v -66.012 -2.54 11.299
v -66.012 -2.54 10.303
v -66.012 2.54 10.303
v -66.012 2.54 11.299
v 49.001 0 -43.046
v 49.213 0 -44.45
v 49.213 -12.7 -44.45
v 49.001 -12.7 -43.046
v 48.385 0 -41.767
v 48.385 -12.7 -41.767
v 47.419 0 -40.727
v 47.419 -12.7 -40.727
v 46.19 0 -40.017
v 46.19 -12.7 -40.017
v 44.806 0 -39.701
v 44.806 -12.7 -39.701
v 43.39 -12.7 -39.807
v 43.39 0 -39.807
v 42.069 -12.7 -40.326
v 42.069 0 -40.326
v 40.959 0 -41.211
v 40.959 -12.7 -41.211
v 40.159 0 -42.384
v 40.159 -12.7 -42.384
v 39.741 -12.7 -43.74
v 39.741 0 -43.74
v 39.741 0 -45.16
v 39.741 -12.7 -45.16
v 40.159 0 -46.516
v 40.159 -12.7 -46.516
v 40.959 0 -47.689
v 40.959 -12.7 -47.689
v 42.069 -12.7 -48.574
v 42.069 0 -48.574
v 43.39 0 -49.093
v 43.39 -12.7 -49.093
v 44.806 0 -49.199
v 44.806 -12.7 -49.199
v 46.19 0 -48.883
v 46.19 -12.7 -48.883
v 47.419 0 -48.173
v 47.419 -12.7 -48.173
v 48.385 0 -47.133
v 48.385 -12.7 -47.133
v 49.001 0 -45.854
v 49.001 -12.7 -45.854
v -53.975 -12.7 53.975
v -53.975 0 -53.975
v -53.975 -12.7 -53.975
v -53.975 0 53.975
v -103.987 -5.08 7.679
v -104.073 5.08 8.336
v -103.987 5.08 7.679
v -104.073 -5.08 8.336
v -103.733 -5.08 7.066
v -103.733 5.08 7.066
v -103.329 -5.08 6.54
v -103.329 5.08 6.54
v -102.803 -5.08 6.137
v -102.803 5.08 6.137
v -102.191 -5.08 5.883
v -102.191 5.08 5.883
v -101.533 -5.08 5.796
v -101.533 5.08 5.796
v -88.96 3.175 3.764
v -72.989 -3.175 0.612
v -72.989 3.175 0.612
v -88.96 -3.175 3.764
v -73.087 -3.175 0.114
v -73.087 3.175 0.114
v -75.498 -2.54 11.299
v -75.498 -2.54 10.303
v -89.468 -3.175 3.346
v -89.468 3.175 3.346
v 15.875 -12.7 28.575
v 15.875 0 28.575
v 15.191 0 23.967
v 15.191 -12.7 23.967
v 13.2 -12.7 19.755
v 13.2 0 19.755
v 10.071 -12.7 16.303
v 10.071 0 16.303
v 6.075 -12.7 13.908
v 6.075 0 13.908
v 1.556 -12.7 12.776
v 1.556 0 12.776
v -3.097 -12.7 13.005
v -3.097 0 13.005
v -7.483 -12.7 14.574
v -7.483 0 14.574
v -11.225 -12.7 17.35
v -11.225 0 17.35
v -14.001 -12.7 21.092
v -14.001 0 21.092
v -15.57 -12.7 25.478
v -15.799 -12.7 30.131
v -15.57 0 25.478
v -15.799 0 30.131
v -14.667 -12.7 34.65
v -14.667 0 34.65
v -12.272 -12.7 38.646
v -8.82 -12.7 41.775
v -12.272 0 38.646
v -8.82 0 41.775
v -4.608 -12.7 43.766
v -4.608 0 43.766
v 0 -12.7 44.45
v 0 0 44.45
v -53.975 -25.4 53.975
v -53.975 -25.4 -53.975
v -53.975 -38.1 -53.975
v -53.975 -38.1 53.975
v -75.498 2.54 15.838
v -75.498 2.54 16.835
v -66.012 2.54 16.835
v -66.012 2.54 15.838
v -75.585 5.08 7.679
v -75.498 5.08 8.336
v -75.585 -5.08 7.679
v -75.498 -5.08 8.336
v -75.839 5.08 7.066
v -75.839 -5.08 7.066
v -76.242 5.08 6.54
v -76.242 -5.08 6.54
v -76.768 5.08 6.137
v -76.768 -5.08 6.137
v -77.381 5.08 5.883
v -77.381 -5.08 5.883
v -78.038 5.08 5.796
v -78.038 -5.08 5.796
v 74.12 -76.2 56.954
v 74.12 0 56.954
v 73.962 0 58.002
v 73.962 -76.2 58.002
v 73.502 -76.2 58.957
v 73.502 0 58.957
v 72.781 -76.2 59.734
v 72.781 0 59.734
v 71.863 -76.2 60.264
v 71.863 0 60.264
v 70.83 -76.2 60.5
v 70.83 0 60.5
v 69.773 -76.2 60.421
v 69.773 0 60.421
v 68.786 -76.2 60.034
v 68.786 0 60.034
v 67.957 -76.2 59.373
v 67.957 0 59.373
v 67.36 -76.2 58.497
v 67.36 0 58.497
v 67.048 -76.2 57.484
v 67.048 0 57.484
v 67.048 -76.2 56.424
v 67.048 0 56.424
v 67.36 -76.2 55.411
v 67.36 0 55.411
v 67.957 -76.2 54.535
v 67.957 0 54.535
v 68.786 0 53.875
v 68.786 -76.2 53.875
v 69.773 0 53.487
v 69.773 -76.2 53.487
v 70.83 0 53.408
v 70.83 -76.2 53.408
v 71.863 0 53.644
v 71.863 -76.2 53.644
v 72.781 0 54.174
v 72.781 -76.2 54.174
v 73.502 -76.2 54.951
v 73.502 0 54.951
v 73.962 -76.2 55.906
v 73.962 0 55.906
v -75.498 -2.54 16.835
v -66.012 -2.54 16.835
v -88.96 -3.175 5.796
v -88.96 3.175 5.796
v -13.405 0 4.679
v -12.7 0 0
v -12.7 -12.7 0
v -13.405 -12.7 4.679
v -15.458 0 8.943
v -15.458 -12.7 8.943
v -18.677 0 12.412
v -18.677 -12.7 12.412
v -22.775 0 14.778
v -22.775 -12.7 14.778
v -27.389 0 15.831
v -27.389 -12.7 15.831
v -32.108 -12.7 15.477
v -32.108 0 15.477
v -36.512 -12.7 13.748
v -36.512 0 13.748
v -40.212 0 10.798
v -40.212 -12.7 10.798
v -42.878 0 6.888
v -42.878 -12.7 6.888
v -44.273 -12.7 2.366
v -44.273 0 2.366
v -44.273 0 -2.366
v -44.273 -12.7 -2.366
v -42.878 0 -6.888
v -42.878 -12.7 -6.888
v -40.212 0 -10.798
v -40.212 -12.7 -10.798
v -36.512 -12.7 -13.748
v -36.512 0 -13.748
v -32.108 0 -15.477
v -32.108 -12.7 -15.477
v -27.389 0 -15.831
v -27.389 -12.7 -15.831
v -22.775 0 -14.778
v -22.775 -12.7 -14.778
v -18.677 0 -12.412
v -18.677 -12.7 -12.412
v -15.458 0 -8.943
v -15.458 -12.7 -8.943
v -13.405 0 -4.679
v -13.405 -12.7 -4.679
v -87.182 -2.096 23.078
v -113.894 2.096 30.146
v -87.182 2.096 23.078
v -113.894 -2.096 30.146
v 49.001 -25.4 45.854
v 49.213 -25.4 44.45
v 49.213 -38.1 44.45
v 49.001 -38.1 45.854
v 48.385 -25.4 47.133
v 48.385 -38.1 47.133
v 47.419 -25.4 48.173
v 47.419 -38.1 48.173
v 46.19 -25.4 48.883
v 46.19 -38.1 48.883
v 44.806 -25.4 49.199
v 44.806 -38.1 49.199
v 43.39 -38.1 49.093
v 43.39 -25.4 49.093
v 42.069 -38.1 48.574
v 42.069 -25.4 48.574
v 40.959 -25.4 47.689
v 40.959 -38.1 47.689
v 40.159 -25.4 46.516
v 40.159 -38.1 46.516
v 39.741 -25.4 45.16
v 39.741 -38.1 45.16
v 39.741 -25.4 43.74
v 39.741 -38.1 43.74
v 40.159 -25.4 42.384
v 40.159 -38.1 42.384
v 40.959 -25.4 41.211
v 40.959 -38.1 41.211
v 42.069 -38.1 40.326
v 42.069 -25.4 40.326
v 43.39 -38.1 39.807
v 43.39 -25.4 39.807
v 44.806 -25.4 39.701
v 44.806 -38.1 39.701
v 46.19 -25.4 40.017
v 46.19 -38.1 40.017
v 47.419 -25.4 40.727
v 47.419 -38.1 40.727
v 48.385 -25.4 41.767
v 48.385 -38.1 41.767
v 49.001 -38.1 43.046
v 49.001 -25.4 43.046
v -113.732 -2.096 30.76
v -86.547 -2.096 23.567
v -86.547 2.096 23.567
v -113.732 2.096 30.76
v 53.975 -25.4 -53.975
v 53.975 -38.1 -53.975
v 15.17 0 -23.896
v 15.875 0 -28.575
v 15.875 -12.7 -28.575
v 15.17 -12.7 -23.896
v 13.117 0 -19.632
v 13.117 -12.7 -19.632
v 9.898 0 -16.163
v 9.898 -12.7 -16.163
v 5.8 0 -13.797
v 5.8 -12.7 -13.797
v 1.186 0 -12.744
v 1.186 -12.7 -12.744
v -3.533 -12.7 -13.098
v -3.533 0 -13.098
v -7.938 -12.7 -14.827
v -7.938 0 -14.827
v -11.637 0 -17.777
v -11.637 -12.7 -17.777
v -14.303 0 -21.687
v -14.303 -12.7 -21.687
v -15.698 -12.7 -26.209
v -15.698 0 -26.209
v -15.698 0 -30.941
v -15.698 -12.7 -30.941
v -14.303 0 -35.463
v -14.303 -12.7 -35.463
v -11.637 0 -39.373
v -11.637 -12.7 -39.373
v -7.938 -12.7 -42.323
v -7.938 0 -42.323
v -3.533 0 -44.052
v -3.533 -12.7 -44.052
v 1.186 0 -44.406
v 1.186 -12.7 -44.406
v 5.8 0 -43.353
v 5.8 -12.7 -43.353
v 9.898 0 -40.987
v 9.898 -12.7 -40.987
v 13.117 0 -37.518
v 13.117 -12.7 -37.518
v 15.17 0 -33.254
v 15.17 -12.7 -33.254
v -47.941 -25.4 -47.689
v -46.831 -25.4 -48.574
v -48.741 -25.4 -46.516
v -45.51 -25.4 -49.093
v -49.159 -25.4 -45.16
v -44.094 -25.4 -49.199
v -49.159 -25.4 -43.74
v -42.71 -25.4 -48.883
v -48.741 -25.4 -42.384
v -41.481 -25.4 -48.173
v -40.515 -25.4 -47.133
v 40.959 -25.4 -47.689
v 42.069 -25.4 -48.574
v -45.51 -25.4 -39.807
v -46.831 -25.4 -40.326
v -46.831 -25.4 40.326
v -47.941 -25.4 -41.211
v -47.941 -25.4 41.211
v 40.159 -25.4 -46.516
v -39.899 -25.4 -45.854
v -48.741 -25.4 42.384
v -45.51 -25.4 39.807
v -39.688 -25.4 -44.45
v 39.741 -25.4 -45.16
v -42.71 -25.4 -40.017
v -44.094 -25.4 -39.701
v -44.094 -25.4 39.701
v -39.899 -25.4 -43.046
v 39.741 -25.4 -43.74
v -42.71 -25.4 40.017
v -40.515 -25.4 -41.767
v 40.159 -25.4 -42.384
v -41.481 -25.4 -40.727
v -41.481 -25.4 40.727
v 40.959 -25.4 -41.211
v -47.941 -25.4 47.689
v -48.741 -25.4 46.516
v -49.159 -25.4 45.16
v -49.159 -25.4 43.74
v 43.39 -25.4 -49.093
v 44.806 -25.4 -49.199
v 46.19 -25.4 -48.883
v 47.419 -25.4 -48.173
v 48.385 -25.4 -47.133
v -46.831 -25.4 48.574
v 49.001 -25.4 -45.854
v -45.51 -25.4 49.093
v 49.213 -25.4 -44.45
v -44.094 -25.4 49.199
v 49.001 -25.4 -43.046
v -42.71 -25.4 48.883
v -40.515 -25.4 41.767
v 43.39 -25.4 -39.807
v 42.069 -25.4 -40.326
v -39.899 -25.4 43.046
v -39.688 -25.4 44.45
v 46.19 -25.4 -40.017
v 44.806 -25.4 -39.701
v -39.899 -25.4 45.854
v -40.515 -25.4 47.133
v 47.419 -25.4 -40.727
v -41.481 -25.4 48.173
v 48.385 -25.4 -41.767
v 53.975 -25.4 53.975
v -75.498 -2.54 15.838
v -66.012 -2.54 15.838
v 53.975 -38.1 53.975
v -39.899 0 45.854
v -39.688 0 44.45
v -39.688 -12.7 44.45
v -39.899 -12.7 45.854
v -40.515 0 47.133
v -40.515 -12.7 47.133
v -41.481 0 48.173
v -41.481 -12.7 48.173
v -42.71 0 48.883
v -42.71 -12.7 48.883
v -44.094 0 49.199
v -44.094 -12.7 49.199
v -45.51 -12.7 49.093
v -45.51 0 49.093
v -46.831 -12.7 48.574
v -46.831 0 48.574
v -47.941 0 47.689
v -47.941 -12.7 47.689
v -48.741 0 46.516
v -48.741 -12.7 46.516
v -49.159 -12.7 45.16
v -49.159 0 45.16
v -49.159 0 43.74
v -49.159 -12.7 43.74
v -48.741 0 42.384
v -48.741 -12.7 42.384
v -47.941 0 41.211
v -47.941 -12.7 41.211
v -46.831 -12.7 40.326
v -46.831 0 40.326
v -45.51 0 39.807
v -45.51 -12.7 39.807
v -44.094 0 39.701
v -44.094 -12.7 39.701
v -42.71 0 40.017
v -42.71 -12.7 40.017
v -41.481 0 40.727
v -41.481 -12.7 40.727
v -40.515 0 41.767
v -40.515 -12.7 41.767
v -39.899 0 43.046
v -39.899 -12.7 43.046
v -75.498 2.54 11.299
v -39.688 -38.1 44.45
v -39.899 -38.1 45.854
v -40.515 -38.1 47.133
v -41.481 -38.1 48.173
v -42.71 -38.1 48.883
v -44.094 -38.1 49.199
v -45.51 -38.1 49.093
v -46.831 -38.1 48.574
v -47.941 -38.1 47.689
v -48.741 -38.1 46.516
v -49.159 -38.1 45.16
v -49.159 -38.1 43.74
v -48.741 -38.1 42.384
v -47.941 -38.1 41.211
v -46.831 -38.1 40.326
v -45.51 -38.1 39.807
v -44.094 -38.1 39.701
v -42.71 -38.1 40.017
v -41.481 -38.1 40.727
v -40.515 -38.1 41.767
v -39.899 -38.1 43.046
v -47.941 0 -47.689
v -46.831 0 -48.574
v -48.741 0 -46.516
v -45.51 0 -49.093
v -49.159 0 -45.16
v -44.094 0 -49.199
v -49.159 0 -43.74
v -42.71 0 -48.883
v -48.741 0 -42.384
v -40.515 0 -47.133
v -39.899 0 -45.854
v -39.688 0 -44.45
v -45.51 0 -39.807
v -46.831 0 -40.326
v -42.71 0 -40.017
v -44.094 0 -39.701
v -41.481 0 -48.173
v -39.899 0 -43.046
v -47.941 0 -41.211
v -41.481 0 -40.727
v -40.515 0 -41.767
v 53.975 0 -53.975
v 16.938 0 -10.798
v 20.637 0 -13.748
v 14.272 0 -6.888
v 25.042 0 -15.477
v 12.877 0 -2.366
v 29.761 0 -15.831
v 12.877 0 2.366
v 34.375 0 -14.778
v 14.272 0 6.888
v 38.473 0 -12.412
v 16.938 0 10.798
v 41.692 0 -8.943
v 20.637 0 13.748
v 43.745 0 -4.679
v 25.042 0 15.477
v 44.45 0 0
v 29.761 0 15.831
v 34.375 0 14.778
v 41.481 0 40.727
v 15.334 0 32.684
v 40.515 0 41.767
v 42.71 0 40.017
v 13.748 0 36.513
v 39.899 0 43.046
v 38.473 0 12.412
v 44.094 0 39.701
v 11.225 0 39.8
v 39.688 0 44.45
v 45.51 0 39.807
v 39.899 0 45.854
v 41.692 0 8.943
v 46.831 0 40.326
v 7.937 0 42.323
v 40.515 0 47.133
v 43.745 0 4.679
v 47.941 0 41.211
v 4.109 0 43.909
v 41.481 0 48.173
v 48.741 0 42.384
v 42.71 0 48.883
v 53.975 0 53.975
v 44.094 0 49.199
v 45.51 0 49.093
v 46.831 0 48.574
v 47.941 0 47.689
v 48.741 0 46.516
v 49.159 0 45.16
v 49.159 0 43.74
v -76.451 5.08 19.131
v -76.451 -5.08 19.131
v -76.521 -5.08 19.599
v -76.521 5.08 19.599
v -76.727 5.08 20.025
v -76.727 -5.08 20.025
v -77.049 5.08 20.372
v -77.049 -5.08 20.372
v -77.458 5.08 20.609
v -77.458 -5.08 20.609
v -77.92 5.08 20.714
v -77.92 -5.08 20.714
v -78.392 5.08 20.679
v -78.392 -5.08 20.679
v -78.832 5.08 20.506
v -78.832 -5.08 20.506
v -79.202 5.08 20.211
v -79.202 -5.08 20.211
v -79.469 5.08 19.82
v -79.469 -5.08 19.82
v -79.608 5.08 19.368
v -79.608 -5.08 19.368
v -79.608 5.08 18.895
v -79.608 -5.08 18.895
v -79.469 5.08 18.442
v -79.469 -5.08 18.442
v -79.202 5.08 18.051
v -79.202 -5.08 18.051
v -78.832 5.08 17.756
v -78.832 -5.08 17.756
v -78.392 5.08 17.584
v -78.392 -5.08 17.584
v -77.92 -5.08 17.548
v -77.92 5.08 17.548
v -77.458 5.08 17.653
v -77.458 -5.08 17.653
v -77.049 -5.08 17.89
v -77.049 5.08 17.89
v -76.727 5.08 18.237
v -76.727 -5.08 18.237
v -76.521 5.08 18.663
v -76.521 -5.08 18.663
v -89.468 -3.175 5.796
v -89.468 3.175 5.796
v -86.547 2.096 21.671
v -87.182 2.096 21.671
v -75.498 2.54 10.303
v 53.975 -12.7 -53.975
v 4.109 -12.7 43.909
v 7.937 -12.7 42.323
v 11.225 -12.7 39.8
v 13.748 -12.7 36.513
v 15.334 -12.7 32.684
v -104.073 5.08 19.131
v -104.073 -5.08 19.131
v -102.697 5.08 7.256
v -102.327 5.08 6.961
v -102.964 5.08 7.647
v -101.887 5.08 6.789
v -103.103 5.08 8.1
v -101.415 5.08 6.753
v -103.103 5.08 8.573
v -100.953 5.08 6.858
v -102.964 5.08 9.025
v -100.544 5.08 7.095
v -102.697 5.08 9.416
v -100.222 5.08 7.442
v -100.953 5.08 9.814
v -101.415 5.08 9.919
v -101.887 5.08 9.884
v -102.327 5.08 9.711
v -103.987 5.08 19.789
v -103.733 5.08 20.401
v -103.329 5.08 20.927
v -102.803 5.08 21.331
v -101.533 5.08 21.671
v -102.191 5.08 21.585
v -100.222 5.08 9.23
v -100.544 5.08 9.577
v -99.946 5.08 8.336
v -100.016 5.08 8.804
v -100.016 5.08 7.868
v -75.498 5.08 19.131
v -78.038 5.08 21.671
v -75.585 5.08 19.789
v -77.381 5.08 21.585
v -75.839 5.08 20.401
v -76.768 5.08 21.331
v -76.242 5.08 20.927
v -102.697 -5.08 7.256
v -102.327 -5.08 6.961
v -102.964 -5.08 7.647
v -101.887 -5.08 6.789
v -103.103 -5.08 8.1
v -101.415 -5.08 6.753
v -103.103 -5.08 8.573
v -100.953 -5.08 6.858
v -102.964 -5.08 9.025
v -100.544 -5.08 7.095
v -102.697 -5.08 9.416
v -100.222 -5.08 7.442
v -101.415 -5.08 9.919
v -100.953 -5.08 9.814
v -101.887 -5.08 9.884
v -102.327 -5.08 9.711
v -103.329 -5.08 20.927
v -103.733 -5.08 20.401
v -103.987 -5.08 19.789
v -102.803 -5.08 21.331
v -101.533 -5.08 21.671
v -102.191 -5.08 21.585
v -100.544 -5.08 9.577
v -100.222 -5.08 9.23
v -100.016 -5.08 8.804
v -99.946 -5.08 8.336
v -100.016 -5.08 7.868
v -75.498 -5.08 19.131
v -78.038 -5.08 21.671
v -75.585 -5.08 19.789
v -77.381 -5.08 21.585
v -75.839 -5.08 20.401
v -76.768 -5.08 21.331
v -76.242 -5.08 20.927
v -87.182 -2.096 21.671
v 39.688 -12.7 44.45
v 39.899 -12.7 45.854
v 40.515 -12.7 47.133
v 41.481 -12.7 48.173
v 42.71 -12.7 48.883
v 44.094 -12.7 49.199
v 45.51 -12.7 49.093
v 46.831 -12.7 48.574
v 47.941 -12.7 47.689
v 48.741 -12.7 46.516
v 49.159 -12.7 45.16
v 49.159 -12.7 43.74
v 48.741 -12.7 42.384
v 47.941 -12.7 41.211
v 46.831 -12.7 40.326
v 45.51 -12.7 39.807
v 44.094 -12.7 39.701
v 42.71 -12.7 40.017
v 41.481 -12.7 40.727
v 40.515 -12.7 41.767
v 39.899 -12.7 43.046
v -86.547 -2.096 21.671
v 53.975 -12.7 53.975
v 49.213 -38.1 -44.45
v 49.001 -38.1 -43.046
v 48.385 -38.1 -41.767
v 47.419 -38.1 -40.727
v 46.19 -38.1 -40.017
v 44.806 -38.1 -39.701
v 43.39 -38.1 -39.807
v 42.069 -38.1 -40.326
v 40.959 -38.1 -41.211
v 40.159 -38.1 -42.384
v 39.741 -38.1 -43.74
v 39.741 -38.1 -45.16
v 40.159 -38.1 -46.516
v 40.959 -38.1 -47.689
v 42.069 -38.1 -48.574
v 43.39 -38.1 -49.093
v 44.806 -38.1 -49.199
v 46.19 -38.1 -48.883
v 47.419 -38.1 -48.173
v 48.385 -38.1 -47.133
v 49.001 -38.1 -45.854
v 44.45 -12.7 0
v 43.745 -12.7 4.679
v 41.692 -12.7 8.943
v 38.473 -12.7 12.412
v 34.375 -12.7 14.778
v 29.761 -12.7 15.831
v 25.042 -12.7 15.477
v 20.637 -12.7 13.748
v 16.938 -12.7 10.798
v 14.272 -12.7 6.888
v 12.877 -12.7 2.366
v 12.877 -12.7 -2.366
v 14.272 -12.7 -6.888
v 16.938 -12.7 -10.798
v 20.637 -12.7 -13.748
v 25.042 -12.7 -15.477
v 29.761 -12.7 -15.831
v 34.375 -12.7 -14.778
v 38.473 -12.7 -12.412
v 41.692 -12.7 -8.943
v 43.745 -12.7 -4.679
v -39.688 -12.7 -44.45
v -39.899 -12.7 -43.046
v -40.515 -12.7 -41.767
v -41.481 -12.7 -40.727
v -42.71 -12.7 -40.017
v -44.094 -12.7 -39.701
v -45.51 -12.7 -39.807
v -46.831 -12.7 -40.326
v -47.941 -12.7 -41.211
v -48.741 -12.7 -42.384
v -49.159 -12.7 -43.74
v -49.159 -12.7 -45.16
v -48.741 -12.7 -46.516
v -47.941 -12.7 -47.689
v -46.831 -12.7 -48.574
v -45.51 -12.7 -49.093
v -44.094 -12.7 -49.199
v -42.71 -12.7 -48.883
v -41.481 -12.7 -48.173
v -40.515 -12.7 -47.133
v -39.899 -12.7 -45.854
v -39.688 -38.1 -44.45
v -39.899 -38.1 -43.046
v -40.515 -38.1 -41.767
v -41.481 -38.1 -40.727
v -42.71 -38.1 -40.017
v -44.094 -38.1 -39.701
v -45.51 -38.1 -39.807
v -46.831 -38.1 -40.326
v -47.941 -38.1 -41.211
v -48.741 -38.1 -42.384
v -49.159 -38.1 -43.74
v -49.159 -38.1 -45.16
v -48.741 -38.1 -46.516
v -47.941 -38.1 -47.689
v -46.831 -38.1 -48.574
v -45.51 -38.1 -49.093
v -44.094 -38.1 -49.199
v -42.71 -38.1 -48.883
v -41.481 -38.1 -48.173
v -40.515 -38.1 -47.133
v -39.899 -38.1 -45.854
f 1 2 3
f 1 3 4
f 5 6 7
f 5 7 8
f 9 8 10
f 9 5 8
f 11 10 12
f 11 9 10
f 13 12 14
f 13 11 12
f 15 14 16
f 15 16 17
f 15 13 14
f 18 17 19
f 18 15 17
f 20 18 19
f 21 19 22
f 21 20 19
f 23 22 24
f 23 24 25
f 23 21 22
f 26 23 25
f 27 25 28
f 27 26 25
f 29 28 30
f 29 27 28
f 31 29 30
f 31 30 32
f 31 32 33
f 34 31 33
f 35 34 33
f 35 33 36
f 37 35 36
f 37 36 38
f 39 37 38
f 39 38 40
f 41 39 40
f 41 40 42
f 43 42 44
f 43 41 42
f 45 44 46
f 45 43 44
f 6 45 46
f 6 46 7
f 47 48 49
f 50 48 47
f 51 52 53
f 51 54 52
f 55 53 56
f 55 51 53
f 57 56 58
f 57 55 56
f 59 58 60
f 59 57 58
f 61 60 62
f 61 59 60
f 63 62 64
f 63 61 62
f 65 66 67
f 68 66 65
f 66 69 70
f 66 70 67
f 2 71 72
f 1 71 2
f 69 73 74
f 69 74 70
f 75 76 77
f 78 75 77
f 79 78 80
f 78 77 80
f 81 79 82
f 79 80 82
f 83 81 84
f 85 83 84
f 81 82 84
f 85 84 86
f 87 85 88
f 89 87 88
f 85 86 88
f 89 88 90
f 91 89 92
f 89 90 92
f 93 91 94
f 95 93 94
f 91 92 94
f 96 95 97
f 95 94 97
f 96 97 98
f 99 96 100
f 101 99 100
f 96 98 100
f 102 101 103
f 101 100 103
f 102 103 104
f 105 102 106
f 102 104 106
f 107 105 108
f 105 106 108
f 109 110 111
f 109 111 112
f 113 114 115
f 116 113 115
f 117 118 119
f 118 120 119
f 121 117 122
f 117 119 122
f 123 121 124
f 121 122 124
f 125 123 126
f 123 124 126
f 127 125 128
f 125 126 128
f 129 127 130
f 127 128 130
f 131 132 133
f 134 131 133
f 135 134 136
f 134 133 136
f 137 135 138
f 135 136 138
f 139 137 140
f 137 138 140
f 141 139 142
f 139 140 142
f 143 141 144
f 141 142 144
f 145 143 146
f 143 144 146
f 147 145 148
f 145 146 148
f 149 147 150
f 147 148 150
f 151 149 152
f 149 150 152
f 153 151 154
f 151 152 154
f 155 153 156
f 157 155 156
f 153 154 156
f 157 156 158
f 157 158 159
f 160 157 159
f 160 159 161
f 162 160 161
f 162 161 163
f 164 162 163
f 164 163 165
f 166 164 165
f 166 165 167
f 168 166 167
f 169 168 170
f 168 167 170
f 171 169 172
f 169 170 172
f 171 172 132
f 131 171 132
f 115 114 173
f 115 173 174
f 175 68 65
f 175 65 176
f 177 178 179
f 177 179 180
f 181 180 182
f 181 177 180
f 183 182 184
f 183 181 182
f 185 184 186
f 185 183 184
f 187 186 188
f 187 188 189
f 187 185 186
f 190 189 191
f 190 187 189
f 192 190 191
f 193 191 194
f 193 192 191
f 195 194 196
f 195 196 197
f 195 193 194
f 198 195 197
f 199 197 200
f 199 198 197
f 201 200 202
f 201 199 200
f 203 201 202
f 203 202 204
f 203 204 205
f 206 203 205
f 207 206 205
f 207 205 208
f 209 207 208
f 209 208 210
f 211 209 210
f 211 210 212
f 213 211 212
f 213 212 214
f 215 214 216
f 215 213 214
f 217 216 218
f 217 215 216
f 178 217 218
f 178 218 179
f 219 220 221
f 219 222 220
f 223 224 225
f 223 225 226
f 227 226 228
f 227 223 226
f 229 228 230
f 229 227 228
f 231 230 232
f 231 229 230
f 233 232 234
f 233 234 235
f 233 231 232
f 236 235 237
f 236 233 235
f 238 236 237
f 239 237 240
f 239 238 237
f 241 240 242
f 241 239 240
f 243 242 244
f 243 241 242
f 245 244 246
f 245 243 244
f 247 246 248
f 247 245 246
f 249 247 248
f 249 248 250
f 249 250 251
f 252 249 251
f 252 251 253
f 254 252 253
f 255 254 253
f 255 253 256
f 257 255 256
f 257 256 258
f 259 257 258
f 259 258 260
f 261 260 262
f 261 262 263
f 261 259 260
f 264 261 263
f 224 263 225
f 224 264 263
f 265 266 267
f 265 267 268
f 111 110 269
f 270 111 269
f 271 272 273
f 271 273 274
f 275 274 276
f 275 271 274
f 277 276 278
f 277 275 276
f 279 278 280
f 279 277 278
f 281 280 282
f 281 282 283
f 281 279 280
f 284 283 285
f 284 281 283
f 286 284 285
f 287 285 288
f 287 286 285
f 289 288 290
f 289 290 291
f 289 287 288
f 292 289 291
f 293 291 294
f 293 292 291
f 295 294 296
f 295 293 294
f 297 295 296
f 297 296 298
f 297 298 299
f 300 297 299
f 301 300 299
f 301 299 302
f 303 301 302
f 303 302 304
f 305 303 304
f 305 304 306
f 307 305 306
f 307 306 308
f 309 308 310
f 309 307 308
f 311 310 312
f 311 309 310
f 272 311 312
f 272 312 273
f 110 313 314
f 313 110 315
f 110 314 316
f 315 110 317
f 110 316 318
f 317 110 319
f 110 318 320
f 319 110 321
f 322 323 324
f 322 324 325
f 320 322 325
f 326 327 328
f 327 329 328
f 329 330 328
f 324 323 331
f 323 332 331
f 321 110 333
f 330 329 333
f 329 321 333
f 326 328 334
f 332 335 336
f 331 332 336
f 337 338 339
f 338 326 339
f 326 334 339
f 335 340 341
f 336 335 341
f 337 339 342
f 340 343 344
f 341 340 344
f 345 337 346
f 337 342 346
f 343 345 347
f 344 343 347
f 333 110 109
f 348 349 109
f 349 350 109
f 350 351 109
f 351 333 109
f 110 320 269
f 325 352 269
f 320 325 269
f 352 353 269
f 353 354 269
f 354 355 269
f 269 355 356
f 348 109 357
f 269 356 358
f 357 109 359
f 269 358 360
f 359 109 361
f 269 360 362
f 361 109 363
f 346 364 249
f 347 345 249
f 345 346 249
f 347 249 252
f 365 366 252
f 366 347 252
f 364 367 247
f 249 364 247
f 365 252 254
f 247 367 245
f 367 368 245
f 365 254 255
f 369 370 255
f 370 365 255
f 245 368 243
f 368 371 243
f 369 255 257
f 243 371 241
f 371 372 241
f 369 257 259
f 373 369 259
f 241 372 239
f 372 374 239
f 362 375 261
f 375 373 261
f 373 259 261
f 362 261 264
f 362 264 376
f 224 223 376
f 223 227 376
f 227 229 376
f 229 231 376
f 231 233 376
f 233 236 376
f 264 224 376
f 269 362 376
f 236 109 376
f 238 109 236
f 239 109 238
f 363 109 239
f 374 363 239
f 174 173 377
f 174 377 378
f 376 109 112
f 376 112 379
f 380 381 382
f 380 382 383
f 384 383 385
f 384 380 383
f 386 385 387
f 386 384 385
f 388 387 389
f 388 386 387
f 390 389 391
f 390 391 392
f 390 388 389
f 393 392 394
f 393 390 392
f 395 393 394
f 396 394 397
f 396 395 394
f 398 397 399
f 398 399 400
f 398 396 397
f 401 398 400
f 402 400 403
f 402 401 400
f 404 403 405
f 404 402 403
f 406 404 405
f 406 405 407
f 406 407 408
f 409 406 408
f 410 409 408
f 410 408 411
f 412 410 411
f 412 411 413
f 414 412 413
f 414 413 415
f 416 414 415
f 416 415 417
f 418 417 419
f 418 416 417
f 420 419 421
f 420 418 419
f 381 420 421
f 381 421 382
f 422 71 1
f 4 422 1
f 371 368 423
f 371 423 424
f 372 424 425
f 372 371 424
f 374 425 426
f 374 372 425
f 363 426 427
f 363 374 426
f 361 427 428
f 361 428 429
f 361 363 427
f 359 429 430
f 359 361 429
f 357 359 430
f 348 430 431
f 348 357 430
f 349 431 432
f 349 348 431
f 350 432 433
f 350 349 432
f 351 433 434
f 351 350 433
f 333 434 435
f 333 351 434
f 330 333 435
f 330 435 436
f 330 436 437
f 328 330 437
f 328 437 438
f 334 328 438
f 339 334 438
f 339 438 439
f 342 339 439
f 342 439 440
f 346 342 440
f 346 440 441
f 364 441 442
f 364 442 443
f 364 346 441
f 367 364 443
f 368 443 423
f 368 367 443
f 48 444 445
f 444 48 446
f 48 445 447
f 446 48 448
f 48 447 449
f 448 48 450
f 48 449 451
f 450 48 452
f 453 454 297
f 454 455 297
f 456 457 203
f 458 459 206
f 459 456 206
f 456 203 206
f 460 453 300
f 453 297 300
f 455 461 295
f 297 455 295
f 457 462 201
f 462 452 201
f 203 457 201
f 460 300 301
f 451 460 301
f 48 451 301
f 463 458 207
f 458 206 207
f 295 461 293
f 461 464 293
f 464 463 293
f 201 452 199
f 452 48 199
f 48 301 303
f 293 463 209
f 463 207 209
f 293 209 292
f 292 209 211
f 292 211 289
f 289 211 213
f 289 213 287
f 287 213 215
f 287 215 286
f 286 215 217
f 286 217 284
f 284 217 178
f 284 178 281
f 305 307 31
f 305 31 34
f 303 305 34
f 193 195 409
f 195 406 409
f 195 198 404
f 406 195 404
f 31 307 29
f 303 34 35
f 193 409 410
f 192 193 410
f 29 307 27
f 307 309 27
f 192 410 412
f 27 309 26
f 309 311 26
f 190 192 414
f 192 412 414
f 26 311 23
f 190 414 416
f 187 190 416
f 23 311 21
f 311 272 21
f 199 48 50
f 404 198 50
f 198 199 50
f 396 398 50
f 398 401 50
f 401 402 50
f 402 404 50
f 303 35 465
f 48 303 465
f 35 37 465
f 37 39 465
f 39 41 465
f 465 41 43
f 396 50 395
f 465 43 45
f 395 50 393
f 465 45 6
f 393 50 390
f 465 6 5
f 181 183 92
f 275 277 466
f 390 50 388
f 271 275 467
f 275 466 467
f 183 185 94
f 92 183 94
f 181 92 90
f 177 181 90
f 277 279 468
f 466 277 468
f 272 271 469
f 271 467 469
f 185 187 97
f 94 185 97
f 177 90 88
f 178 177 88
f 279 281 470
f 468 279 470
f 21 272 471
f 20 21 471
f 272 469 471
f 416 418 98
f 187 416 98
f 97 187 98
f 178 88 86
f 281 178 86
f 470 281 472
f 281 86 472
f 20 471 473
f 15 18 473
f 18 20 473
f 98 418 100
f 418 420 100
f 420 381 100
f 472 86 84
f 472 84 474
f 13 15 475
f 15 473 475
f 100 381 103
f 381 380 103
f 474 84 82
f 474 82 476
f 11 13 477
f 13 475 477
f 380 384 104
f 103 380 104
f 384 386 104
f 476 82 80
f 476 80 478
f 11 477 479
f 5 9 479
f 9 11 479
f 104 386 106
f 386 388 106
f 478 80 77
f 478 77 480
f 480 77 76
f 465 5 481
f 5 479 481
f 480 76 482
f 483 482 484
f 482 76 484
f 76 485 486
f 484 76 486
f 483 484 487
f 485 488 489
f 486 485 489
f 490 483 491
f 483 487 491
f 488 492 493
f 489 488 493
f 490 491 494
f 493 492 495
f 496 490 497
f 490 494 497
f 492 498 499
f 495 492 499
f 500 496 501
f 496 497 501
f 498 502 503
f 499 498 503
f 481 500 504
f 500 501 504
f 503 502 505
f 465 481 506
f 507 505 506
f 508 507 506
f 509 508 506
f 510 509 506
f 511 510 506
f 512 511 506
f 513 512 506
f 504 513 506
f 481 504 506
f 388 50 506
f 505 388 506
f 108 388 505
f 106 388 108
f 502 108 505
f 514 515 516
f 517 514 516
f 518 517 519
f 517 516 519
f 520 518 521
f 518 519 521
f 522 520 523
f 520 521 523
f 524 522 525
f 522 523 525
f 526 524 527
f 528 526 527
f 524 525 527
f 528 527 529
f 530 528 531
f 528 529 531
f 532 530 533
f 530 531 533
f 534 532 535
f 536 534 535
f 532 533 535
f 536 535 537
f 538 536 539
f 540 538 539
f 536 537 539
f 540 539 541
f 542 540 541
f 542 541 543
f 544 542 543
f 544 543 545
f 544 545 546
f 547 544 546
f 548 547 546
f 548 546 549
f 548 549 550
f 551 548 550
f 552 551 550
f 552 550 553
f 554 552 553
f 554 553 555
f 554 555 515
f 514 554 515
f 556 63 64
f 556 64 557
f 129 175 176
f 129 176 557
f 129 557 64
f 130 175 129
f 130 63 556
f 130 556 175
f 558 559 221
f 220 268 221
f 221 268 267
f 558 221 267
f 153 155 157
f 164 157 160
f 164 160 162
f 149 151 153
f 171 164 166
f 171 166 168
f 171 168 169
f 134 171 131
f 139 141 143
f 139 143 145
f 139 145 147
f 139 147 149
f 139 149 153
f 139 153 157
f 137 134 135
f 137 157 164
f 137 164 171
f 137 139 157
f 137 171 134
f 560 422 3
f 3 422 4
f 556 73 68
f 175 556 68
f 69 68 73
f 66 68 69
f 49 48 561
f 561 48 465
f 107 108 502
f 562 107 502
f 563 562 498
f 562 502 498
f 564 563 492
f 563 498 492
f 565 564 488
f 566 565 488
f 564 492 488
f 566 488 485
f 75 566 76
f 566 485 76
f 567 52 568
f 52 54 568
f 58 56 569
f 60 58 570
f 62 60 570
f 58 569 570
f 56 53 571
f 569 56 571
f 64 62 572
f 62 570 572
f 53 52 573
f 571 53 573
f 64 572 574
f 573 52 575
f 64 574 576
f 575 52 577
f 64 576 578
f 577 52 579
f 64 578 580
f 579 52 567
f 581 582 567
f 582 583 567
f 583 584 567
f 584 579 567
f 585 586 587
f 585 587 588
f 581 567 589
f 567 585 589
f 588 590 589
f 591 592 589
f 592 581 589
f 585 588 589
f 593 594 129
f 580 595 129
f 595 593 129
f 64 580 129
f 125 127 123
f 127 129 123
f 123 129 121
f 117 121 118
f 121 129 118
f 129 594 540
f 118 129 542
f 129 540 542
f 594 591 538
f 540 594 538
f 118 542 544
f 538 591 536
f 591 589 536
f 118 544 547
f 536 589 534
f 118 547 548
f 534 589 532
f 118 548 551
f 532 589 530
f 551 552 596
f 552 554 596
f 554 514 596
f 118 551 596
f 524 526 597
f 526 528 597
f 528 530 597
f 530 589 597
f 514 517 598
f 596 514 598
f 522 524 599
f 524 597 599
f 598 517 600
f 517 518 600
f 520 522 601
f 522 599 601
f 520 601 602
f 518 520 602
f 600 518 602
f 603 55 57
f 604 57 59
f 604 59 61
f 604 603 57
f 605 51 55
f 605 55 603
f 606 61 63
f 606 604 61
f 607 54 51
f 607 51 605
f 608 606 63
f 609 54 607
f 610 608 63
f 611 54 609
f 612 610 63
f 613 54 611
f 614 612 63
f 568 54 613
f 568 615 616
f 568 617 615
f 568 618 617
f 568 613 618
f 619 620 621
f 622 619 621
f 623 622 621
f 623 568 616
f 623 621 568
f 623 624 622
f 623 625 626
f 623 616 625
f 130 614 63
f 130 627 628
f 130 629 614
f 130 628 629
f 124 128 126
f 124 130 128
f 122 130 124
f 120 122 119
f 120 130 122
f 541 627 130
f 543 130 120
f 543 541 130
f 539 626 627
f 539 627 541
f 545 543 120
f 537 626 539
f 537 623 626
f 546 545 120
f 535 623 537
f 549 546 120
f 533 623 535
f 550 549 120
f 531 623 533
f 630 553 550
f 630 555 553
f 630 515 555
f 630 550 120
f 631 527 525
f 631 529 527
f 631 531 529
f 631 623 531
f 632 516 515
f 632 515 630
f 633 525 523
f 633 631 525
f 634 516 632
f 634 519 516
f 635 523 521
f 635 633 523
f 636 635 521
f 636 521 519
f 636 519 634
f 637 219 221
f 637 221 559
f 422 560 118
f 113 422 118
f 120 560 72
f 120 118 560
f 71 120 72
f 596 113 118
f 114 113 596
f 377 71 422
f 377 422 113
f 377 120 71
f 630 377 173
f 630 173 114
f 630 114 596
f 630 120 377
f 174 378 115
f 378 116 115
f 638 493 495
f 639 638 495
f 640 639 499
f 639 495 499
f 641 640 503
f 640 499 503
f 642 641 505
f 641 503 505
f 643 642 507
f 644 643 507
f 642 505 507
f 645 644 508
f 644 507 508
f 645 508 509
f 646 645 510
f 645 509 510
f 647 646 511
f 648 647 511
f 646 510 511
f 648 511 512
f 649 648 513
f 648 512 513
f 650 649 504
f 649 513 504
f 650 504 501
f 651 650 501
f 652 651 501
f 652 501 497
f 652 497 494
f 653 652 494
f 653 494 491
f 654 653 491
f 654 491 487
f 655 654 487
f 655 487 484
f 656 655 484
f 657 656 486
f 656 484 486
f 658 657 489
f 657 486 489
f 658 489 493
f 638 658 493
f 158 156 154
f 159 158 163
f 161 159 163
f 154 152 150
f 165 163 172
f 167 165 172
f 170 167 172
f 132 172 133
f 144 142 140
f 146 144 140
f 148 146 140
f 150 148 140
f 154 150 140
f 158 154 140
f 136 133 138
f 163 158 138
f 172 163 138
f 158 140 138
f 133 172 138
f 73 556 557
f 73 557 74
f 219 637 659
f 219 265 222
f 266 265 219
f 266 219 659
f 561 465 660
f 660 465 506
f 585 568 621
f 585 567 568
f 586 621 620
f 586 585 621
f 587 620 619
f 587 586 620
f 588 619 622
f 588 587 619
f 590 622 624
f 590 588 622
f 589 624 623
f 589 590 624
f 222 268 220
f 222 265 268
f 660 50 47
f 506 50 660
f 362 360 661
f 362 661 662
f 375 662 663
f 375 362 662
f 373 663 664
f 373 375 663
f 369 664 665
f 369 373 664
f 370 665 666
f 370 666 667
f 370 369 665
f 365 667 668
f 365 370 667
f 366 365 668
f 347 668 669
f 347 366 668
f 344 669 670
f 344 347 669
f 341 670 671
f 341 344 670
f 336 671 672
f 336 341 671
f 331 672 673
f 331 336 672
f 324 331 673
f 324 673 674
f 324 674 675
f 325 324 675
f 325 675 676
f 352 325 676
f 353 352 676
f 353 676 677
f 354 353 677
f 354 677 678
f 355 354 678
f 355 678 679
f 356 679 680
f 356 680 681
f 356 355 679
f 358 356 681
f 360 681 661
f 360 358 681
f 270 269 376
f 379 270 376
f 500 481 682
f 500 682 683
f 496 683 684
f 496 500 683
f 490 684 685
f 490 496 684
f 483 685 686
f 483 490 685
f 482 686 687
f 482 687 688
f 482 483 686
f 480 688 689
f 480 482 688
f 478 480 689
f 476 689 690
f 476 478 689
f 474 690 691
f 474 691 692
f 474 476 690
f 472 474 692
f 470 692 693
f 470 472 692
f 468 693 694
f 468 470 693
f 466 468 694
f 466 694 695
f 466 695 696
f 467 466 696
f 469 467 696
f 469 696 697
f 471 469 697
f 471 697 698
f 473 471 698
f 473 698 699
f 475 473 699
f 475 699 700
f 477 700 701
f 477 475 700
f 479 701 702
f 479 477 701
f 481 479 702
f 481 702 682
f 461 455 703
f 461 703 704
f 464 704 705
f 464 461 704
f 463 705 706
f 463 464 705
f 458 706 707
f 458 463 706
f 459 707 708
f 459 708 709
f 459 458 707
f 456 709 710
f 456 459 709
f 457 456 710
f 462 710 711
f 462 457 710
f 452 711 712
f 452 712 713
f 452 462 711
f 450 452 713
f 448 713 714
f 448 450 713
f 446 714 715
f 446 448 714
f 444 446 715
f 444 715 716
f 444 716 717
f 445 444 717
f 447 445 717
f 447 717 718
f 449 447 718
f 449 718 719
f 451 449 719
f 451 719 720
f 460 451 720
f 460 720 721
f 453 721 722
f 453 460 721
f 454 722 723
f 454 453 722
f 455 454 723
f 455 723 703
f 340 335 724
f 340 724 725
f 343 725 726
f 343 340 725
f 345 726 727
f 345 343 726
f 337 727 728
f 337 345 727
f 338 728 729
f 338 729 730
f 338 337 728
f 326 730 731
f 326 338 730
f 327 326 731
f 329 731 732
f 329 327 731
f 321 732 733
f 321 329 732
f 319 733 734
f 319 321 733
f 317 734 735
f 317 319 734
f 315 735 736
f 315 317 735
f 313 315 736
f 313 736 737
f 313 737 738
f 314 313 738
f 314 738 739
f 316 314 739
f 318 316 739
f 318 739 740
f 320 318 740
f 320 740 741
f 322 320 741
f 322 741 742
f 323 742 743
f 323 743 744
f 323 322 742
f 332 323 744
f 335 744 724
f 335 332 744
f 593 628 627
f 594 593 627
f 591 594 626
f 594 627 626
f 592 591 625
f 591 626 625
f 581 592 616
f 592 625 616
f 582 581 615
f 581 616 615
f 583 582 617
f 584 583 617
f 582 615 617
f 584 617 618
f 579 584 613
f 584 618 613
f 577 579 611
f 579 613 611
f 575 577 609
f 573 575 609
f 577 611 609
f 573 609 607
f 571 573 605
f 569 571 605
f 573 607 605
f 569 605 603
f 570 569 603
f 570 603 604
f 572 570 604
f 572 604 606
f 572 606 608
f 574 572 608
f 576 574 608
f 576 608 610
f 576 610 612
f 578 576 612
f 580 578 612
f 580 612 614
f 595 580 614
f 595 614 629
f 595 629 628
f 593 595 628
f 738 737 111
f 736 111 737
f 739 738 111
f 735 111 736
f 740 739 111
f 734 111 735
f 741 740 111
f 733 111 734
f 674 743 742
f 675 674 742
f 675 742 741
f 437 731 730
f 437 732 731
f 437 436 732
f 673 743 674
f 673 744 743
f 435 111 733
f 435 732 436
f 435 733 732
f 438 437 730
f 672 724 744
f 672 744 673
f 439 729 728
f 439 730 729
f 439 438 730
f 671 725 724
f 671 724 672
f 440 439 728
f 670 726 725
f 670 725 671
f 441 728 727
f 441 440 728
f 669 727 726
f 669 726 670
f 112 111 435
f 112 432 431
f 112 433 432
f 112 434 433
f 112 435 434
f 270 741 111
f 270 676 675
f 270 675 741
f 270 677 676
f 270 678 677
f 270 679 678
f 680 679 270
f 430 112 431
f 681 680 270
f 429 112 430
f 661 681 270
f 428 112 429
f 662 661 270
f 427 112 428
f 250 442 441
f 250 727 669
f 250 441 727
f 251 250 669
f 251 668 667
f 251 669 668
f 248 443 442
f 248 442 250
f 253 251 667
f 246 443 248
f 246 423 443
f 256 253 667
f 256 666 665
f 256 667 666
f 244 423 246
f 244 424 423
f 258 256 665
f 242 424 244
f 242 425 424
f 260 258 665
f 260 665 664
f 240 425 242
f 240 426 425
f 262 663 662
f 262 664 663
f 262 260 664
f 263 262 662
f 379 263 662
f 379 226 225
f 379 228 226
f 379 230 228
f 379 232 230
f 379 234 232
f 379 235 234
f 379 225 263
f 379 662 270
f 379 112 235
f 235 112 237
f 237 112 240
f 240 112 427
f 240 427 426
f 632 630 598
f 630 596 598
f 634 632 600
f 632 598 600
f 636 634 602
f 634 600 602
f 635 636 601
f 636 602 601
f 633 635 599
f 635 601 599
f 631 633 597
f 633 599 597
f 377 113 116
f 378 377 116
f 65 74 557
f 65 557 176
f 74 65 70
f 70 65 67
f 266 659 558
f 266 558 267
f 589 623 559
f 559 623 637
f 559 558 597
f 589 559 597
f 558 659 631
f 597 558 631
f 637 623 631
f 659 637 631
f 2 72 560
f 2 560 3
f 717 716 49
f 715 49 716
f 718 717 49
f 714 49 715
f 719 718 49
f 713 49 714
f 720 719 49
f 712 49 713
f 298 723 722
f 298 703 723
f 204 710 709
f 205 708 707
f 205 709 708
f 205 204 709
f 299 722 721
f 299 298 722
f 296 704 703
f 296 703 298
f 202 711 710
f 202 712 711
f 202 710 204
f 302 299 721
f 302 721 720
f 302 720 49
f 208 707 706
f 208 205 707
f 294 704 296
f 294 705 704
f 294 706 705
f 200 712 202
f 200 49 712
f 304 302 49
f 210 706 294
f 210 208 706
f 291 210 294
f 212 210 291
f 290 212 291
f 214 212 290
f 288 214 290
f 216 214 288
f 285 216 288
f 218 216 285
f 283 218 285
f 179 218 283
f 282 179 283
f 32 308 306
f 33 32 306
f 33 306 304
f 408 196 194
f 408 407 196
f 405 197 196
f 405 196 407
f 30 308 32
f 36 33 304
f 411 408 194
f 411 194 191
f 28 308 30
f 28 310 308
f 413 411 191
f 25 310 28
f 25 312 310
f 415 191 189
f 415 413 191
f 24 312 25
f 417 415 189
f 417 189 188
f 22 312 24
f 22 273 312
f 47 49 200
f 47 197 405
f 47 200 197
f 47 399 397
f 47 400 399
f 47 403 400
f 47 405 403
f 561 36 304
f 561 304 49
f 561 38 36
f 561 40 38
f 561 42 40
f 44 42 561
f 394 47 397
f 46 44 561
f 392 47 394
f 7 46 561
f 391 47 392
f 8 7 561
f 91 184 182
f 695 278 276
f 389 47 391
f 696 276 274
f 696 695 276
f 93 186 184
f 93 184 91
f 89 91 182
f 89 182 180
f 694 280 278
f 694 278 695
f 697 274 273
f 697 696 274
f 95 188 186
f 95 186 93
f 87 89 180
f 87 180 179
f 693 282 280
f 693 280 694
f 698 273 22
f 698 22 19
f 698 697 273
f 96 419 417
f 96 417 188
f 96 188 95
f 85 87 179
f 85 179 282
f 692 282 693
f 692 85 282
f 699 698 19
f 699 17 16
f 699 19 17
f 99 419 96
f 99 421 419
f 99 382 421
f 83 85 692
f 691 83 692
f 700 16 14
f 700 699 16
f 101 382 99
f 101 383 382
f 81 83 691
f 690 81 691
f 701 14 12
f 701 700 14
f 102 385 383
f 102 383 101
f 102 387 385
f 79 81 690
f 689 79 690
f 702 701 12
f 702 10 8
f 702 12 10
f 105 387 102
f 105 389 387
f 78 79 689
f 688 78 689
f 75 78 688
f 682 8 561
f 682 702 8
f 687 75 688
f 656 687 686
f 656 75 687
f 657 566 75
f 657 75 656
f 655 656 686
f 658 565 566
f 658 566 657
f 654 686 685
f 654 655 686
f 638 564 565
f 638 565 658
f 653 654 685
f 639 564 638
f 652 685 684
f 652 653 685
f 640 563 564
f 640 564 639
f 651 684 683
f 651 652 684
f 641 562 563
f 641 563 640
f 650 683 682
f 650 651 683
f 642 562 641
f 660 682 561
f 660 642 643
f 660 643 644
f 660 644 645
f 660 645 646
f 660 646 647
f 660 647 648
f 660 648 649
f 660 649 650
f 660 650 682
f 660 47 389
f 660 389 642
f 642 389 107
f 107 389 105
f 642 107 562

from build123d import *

# Parameters (mm, degrees)
F0_W      = 107.95
F0_H      = 107.95
F0_R      = 4.7625
F0_R_2    = 15.875
F1_DEPTH  = 12.7
F3_W      = 107.95
F3_H      = 107.95
F3_R      = 4.7625
F4_DEPTH  = 12.7
F5_R      = 3.556
F6_DEPTH  = 76.2
F7_W      = 28.575
F7_H      = 15.875
F8_DEPTH  = 5.08
F9_R      = 2.54
F10_R     = 1.5875
F11_DEPTH = 25.4
F13_DEPTH = 3.175
F14_W     = 10.1481601596
F14_H     = 0.9966949001
F14_W_2   = 10.3293806314
F15_DEPTH = 2.54
F17_DEPTH = 2.0955


with BuildPart() as f1:
    # F0 (on Front) → F1 (new body)
    with BuildSketch(Plane.XZ):
        Rectangle(F0_W, F0_H)
        with Locations((-44.45, -44.45)):
            Circle(F0_R, mode=Mode.SUBTRACT)
        with Locations((0, -28.575)):
            Circle(F0_R_2, mode=Mode.SUBTRACT)
        with Locations((44.45, -44.45)):
            Circle(F0_R, mode=Mode.SUBTRACT)
        with Locations((-28.575, 0)):
            Circle(F0_R_2, mode=Mode.SUBTRACT)
        with Locations((-44.45, 44.45)):
            Circle(F0_R, mode=Mode.SUBTRACT)
        with Locations((28.575, 0)):
            Circle(F0_R_2, mode=Mode.SUBTRACT)
        with BuildLine():
            ThreePointArc((-4.16e-08, 44.45), (11.2253201366, 39.800320166), (15.875, 28.575))
            ThreePointArc((15.875, 28.575), (-11.2253201366, 17.349679834), (-4.16e-08, 44.45))
        make_face(mode=Mode.SUBTRACT)
        with BuildLine():
            ThreePointArc((49.2125, 44.45), (44.45, 39.6875), (39.6875, 44.45))
            ThreePointArc((39.6875, 44.45), (44.45, 49.2125), (49.2125, 44.45))
        make_face(mode=Mode.SUBTRACT)
    extrude(amount=F1_DEPTH)


with BuildPart() as f4:
    # F3 (on offset) → F4 (new body)
    with BuildSketch(Plane.XZ.offset(25.4)):
        Rectangle(F3_W, F3_H)
        with Locations((-44.45, -44.45)):
            Circle(F3_R, mode=Mode.SUBTRACT)
        with Locations((44.45, -44.45)):
            Circle(F3_R, mode=Mode.SUBTRACT)
        with Locations((-44.45, 44.45)):
            Circle(F3_R, mode=Mode.SUBTRACT)
        with Locations((44.45, 44.45)):
            Circle(F3_R, mode=Mode.SUBTRACT)
    extrude(amount=F4_DEPTH)


with BuildPart() as f6:
    # F5 (on Front) → F6 (new body)
    with BuildSketch(Plane.XZ):
        with Locations((70.5638378859, 56.9540932775)):
            Circle(F5_R)
    extrude(amount=F6_DEPTH)


with BuildPart() as f8:
    # F7 (on Front) → F8 (new body, symmetric)
    with BuildSketch(Plane.XZ):
        with Locations((-89.7859223187, 13.733718681)):
            Rectangle(F7_W, F7_H)
    extrude(amount=F8_DEPTH, both=True)

    # F9
    f9_edges = [f8.edges().sort_by_distance(p)[0] for p in [
        (-104.073422, 0, 21.671219),
        (-104.073422, 0, 5.796219),
        (-75.498422, 0, 5.796219),
        (-75.498422, 0, 21.671219),
    ]]
    fillet(f9_edges, radius=F9_R)

    # F10 (on face) → F11 (cut)
    with BuildSketch(Plane.XZ.offset(5.08)):
        with Locations((-101.5334223187, 8.336218681)):
            Circle(F10_R)
        with Locations((-78.0384223187, 19.131218681)):
            Circle(F10_R)
    extrude(amount=-F11_DEPTH, mode=Mode.SUBTRACT)

    # F12 (on Front) → F13 (join, symmetric)
    with BuildSketch(Plane.XZ):
        Polygon((-88.9604223187, 6.1318718059), (-89.4684223187, 6.1318718059), (-89.4684223187, 3.3461439855), (-73.0874799634, 0.1140200436), (-72.9891424021, 0.6124111792), (-88.9604223187, 3.7637046202), align=None)
    extrude(amount=F13_DEPTH, both=True)

    # F14 (on Front) → F15 (join, symmetric)
    with BuildSketch(Plane.XZ):
        with Locations((-71.0859186947, 16.3361900486)):
            Rectangle(F14_W, F14_H)
        with Locations((-71.1765289307, 10.8009177894)):
            Rectangle(F14_W_2, F14_H)
    extrude(amount=F15_DEPTH, both=True)

    # F16 (on Front) → F17 (join, symmetric)
    with BuildSketch(Plane.XZ):
        Polygon((-87.1824223187, 23.0784109219), (-87.1824223187, 19.6668980286), (-86.5474223187, 19.6668980286), (-86.5474223187, 23.5672486144), (-113.7316583056, 30.7598784464), (-113.8940826058, 30.1460027695), align=None)
    extrude(amount=F17_DEPTH, both=True)


solid = Compound([f1.part, f4.part, f6.part, f8.part])
